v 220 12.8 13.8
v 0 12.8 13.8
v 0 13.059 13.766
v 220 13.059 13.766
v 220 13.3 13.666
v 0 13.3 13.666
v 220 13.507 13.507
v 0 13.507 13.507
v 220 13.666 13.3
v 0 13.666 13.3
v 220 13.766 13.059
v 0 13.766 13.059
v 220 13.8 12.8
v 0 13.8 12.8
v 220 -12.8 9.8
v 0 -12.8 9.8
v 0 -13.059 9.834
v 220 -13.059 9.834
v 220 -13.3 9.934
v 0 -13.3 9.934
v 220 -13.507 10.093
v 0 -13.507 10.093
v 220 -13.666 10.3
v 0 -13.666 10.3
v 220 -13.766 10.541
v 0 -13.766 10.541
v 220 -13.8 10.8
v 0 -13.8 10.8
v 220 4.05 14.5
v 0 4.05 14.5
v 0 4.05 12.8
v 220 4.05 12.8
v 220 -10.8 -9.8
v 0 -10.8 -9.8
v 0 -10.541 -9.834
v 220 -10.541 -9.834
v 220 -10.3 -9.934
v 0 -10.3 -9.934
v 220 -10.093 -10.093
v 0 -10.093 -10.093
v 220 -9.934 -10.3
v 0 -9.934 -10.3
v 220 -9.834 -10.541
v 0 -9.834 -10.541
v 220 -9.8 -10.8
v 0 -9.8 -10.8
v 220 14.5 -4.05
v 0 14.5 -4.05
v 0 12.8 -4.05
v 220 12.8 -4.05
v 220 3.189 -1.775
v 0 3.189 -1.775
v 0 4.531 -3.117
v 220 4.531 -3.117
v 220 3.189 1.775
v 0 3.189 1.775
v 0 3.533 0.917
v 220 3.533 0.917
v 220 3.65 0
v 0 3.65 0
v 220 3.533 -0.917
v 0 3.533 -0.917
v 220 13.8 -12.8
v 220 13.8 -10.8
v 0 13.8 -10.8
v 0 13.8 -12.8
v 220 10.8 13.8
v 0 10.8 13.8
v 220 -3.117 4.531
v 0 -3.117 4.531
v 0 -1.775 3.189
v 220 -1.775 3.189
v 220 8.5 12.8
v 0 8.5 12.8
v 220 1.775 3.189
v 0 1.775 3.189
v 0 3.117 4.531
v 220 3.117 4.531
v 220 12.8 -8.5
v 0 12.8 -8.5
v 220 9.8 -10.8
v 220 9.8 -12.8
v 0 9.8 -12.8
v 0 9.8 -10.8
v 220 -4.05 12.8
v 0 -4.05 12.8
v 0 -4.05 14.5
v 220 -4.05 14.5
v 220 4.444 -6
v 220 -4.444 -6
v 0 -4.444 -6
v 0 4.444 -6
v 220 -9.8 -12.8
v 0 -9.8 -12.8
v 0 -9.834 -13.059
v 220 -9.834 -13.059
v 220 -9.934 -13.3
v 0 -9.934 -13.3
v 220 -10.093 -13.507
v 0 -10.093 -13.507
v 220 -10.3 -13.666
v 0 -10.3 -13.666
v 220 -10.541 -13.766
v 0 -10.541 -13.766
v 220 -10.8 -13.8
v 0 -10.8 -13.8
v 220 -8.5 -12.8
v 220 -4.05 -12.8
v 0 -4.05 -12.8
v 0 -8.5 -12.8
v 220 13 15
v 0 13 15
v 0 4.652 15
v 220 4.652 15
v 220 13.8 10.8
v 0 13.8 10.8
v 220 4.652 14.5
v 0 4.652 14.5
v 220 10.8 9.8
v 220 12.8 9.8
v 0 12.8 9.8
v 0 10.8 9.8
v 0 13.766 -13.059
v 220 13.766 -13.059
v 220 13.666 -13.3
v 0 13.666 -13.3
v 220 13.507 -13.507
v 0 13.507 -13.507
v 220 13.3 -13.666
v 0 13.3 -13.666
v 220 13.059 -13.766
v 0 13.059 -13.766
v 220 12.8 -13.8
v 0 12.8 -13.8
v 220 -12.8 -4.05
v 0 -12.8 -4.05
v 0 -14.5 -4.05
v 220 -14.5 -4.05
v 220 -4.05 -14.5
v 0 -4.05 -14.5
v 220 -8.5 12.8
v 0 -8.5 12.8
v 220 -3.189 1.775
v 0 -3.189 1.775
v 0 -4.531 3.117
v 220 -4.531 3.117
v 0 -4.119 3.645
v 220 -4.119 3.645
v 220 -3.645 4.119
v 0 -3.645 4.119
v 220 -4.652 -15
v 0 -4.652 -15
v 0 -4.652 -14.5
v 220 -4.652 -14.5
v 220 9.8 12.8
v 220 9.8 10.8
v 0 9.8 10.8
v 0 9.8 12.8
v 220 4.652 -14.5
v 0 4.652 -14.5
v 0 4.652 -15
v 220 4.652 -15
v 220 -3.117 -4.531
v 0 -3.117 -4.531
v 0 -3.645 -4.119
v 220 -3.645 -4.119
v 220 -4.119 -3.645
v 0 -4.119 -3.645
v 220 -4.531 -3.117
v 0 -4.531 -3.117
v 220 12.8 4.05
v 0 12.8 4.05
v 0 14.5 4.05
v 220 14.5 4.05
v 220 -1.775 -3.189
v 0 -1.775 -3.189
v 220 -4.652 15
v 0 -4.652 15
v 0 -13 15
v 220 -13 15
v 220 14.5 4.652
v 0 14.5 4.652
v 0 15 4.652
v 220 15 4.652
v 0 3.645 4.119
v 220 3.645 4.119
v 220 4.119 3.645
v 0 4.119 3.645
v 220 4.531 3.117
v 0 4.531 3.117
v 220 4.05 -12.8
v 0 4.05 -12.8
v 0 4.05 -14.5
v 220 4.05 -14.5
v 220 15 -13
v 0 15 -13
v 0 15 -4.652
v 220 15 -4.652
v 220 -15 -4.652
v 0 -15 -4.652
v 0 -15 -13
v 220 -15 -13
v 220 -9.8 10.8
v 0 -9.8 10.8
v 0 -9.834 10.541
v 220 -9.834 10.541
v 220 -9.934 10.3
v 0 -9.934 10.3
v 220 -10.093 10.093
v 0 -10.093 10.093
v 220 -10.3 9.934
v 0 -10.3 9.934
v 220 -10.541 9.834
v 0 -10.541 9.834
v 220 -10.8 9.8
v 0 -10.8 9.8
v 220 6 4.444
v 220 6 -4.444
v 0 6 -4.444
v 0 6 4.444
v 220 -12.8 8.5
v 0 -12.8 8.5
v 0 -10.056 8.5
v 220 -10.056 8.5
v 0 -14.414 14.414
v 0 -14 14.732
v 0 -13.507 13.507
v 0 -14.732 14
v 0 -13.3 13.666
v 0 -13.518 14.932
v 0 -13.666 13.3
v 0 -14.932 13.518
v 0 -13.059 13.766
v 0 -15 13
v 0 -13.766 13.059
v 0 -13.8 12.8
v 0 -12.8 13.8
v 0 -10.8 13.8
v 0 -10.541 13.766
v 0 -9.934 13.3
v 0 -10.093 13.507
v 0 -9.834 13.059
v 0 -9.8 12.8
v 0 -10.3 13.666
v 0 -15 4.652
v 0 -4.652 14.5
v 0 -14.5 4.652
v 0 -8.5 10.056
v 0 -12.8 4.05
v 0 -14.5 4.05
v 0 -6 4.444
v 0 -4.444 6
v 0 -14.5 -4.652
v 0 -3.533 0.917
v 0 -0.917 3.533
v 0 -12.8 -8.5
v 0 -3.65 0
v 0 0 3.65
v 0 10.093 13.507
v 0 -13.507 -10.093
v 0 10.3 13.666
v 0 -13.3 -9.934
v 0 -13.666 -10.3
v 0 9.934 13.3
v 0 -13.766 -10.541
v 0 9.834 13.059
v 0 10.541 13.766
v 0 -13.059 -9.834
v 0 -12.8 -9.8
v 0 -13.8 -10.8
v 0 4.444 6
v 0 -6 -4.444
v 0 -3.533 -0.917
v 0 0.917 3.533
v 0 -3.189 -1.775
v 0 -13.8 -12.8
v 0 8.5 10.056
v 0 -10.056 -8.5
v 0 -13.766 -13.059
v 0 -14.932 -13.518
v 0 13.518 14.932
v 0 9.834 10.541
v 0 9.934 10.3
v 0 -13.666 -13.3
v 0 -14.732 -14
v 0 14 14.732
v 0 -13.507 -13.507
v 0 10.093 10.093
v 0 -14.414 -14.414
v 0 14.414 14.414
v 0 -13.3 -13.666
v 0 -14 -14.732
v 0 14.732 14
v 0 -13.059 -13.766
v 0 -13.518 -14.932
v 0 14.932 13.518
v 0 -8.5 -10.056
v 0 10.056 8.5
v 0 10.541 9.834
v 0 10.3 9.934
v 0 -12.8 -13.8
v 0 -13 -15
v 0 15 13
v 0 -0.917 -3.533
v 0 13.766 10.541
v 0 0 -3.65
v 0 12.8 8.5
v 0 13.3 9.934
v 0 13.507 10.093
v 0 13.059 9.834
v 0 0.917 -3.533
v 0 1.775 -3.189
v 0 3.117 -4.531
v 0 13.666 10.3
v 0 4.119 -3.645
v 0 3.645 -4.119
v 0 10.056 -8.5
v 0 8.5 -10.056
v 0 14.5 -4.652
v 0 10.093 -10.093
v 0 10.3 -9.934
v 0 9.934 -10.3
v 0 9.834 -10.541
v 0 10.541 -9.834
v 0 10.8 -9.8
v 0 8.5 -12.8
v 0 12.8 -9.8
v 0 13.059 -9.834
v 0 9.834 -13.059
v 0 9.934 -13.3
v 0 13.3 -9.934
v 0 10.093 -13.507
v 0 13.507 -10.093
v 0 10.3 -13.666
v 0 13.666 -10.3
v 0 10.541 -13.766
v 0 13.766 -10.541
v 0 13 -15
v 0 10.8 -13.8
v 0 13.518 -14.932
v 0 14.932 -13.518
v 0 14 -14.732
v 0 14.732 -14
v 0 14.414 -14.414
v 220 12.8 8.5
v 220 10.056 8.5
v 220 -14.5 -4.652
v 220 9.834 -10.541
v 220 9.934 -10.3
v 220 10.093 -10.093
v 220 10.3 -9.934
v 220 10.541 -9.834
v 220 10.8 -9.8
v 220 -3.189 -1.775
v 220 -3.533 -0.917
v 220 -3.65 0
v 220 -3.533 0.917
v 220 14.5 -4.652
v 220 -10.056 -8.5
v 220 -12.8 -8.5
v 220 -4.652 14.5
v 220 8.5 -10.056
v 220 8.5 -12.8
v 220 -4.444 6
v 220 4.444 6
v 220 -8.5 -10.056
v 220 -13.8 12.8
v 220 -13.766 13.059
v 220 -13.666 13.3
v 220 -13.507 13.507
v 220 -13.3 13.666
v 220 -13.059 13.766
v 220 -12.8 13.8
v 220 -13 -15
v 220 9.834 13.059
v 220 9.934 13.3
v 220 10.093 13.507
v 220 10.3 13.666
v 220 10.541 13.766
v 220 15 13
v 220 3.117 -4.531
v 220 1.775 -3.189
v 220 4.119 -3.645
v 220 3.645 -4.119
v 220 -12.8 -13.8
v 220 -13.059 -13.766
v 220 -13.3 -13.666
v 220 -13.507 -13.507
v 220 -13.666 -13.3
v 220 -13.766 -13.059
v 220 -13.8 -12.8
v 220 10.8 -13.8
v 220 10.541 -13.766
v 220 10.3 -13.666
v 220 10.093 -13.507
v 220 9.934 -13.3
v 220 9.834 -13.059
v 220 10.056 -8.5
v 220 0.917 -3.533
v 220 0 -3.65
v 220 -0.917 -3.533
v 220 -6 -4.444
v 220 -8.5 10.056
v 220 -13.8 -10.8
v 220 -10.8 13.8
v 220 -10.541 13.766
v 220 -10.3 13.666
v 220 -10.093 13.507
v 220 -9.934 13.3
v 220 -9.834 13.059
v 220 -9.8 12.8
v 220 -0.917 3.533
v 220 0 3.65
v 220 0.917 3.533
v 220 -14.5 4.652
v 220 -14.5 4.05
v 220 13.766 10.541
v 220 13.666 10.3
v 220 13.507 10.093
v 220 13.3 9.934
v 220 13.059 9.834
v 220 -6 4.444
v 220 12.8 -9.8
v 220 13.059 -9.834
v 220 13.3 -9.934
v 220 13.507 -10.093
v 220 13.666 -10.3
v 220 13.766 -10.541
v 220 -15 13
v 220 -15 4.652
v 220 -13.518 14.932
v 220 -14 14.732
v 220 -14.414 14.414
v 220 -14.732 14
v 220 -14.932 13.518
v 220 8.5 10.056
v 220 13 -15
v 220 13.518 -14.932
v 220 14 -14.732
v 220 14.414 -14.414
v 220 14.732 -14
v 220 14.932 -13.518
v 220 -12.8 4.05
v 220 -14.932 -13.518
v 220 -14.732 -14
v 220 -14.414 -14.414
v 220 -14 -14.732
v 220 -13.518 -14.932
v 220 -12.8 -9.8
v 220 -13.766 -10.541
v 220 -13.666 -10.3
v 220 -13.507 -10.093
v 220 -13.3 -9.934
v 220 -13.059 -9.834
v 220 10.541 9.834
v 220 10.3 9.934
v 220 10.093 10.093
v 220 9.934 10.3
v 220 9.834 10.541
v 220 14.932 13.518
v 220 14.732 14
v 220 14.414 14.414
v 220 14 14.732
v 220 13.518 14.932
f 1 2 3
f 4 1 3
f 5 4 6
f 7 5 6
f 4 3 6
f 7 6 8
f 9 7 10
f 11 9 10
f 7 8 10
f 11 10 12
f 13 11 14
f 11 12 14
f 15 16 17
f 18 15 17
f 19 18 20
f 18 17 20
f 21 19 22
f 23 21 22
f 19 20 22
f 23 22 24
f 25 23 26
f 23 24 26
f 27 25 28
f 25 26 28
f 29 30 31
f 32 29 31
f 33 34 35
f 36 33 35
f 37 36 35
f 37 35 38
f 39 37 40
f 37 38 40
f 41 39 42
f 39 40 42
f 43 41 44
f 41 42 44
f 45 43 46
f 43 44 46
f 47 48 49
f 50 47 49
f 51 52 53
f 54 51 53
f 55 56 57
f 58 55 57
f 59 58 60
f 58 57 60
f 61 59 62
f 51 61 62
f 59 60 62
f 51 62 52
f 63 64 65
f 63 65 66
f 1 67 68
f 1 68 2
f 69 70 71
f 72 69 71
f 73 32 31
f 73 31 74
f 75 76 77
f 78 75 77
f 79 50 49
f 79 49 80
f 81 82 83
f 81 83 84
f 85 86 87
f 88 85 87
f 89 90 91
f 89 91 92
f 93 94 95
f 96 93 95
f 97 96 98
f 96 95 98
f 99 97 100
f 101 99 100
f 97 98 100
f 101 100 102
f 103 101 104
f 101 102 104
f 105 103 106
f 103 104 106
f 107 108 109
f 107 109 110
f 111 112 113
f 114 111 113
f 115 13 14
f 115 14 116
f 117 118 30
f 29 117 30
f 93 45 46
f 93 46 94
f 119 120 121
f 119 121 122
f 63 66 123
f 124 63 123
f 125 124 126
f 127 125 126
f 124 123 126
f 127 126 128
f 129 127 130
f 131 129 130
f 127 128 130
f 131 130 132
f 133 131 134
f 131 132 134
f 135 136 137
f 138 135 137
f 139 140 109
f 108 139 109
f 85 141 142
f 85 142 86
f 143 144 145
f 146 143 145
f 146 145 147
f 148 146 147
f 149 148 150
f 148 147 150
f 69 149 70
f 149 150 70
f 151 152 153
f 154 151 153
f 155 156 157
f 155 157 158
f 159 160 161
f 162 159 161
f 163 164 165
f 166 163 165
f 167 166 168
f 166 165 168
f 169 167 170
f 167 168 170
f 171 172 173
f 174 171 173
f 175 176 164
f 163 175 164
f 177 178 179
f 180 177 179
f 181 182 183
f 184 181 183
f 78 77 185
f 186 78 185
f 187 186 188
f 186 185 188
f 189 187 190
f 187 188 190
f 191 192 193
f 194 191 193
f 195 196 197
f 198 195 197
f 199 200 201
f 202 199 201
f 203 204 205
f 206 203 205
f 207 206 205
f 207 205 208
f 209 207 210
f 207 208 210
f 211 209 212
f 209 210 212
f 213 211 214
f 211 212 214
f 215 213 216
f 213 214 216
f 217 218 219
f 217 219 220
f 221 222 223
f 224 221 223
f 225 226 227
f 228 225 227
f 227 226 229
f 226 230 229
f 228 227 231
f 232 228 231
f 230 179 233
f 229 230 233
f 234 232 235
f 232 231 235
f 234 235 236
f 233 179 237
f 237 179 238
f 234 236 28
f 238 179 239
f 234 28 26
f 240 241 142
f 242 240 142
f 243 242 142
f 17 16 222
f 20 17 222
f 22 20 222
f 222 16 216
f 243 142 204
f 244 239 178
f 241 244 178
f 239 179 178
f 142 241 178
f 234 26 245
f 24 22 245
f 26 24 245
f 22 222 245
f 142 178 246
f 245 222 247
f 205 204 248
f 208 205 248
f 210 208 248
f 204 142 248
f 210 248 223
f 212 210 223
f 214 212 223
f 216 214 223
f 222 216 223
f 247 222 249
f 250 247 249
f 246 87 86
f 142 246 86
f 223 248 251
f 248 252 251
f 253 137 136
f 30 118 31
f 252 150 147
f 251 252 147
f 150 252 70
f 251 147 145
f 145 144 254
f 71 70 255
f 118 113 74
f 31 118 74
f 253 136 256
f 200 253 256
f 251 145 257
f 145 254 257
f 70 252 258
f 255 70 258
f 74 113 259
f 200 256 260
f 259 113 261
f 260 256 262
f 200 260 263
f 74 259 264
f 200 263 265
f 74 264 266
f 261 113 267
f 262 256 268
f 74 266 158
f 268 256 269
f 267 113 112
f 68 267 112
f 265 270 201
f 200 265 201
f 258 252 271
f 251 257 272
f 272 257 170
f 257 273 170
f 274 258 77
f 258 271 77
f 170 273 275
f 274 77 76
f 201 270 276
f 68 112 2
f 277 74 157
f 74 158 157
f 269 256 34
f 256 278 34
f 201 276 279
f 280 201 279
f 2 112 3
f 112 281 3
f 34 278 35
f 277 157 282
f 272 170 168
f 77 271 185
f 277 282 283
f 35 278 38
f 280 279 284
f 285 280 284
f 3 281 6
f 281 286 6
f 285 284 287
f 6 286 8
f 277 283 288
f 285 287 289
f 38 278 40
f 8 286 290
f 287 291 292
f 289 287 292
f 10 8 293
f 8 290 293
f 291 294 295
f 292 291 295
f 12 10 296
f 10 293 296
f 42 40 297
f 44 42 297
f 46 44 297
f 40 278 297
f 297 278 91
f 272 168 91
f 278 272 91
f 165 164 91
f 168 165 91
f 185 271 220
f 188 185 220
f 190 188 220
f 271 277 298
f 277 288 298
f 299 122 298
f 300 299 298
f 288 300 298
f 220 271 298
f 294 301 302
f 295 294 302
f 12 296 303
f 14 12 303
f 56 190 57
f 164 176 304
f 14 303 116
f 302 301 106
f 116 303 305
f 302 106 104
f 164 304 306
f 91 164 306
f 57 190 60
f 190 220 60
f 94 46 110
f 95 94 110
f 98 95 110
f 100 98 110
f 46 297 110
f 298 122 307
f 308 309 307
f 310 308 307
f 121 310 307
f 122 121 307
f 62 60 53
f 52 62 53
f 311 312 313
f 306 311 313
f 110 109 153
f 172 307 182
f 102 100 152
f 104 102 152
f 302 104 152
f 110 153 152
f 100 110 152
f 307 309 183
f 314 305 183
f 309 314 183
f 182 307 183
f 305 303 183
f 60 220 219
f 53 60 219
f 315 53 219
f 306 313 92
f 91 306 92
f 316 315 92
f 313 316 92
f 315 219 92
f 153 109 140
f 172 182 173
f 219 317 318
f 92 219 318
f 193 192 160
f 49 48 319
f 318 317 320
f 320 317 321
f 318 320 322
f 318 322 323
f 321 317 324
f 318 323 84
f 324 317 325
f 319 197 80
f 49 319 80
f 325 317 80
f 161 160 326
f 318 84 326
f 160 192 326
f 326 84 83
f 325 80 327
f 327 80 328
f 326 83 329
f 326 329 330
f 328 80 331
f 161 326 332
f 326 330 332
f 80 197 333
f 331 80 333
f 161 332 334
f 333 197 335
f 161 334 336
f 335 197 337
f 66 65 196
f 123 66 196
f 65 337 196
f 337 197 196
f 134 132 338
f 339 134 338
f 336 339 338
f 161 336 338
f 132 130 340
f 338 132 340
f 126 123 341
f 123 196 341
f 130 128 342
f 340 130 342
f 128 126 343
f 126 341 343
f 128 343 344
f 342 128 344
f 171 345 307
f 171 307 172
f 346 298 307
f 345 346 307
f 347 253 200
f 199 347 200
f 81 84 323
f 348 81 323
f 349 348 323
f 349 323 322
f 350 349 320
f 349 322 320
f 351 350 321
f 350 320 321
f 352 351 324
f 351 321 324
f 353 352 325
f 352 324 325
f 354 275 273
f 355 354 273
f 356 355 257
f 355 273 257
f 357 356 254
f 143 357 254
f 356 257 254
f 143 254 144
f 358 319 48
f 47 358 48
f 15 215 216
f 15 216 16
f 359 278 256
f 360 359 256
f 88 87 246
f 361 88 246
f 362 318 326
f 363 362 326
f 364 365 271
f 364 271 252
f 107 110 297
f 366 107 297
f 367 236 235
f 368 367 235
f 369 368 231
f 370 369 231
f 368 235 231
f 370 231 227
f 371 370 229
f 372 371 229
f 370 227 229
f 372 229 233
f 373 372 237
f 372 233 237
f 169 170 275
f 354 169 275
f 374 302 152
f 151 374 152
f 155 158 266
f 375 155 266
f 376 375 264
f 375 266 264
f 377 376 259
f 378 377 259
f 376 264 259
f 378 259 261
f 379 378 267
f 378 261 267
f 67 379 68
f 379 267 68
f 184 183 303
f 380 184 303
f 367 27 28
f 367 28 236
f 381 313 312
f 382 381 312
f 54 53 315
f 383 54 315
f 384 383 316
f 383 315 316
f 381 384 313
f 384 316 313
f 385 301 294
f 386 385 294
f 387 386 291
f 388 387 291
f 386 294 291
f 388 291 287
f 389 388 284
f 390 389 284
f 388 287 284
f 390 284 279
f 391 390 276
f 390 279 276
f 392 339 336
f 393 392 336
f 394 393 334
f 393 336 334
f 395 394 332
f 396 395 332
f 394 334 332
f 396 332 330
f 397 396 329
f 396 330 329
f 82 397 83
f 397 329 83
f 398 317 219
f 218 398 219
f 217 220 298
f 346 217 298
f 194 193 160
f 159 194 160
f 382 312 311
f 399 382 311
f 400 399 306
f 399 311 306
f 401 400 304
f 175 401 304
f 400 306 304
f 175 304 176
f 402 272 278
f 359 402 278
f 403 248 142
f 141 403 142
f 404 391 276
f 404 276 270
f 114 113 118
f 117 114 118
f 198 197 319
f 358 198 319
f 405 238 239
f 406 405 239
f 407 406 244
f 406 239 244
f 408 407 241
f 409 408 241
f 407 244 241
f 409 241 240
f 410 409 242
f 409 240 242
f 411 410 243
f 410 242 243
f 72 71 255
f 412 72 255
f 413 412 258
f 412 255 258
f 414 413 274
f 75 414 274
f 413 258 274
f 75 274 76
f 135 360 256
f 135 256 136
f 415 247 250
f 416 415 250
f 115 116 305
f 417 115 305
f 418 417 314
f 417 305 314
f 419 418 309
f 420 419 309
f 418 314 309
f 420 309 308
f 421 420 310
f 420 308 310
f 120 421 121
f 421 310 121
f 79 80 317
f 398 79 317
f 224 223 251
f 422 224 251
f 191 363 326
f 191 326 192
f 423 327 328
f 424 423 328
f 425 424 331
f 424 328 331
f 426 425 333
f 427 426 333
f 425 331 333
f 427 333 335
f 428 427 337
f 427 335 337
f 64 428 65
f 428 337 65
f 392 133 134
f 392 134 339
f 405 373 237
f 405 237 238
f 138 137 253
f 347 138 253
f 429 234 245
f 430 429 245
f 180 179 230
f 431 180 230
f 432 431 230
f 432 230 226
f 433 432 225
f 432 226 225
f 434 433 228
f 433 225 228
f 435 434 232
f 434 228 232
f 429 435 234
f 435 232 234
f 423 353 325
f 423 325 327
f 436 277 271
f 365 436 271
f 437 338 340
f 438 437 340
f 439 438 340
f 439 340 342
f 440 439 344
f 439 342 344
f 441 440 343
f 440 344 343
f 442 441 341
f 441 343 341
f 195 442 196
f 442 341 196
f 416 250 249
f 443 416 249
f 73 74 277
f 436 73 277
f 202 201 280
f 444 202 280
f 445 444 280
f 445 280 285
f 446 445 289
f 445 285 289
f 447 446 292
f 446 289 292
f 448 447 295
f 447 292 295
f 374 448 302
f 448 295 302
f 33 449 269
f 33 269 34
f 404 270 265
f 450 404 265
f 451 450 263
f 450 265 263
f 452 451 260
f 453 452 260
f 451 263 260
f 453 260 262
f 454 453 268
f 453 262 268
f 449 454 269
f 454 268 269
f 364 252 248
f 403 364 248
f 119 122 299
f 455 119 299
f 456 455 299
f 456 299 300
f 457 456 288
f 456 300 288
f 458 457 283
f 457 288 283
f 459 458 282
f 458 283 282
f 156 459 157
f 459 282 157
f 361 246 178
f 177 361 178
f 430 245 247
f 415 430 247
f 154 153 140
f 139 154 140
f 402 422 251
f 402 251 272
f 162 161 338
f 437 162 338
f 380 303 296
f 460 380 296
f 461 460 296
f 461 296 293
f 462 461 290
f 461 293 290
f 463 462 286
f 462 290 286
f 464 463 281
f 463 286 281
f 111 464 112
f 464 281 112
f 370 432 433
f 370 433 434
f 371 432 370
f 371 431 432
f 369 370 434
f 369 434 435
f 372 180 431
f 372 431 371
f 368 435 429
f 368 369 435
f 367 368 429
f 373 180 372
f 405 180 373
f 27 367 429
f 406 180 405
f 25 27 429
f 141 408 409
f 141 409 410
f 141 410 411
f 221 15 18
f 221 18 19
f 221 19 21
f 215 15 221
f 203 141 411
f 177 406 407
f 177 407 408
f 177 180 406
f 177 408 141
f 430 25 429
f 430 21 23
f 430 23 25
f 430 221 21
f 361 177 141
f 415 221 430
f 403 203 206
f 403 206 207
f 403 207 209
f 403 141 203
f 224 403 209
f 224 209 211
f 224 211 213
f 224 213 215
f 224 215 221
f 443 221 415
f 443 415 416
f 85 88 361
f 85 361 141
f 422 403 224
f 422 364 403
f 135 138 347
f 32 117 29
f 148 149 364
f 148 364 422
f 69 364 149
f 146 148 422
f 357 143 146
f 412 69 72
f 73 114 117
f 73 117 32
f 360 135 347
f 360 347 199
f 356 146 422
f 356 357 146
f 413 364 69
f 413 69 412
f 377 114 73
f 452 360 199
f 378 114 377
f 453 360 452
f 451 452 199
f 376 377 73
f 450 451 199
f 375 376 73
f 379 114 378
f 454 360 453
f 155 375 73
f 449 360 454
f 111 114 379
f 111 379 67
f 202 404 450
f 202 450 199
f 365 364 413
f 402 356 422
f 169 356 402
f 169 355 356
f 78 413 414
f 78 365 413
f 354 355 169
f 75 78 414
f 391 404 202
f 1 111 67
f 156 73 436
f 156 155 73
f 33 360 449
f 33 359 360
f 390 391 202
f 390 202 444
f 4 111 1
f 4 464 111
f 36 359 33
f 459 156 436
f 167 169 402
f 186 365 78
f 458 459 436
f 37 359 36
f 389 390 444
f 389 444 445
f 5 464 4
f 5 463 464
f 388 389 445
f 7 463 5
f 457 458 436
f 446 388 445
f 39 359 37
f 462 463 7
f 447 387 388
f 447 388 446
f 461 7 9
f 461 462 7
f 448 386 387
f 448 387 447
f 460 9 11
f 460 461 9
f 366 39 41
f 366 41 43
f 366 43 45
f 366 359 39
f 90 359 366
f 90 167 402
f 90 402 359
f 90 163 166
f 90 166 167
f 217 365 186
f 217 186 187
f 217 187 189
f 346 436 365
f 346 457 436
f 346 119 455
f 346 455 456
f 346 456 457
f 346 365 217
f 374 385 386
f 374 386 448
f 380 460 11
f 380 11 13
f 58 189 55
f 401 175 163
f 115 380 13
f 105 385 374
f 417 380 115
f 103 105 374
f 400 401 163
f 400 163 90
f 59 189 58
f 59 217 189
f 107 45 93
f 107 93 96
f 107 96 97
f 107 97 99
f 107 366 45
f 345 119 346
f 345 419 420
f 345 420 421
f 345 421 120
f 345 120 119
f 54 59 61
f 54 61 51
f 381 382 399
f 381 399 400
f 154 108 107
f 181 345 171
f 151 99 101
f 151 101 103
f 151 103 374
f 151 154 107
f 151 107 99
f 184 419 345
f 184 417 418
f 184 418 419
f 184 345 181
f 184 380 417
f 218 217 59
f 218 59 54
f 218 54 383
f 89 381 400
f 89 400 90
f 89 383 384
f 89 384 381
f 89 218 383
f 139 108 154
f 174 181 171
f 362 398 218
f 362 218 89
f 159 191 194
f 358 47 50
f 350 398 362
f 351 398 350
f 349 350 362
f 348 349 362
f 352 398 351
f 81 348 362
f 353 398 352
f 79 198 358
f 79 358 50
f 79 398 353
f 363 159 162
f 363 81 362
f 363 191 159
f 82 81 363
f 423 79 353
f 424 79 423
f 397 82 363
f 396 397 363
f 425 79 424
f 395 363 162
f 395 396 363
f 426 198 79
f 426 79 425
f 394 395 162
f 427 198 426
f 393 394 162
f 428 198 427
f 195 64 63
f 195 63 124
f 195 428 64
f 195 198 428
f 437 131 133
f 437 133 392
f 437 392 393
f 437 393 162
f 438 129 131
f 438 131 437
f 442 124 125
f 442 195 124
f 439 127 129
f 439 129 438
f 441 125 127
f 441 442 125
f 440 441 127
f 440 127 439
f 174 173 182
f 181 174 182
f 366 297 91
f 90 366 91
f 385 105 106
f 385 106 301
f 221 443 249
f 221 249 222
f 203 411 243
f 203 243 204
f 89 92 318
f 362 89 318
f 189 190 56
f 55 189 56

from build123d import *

# Parameters (mm, degrees)
AUFSATZ_LINEAR_AUSTRAGEN1_DEPTH = 220


with BuildPart() as part:
    # Skizze1 → Aufsatz-Linear austragen1 (new body)
    with BuildSketch(Plane(origin=(0, 0, 0), x_dir=(0, 0, -1), z_dir=(1, 0, 0))):
        with BuildLine():
            Line((10.055634919, 8.5), (12.8, 8.5))
            Line((12.8, 8.5), (12.8, 4.05))
            Line((12.8, 4.05), (14.5, 4.05))
            Line((14.5, 4.05), (14.5, 4.651637069))
            Line((14.5, 4.651637069), (15, 4.651637069))
            Line((15, 4.651637069), (15, 13))
            ThreePointArc((15, 13), (14.414213562, 14.414213562), (13, 15))
            Line((13, 15), (4.651637069, 15))
            Line((4.651637069, 15), (4.651637069, 14.5))
            Line((4.651637069, 14.5), (4.05, 14.5))
            Line((4.05, 14.5), (4.05, 12.8))
            Line((4.05, 12.8), (8.5, 12.8))
            Line((8.5, 12.8), (8.5, 10.055634919))
            Line((8.5, 10.055634919), (4.444365081, 6))
            Line((4.444365081, 6), (-4.444365081, 6))
            Line((-4.444365081, 6), (-8.5, 10.055634919))
            Line((-8.5, 10.055634919), (-8.5, 12.8))
            Line((-8.5, 12.8), (-4.05, 12.8))
            Line((-4.05, 12.8), (-4.05, 14.5))
            Line((-4.05, 14.5), (-4.651637069, 14.5))
            Line((-4.651637069, 14.5), (-4.651637069, 15))
            Line((-4.651637069, 15), (-13, 15))
            ThreePointArc((-13, 15), (-14.414213562, 14.414213562), (-15, 13))
            Line((-15, 13), (-15, 4.651637069))
            Line((-15, 4.651637069), (-14.5, 4.651637069))
            Line((-14.5, 4.651637069), (-14.5, 4.05))
            Line((-14.5, 4.05), (-12.8, 4.05))
            Line((-12.8, 4.05), (-12.8, 8.5))
            Line((-12.8, 8.5), (-10.055634919, 8.5))
            Line((-10.055634919, 8.5), (-6, 4.444365081))
            Line((-6, 4.444365081), (-6, -4.444365081))
            Line((-6, -4.444365081), (-10.055634919, -8.5))
            Line((-10.055634919, -8.5), (-12.8, -8.5))
            Line((-12.8, -8.5), (-12.8, -4.05))
            Line((-12.8, -4.05), (-14.5, -4.05))
            Line((-14.5, -4.05), (-14.5, -4.651637069))
            Line((-14.5, -4.651637069), (-15, -4.651637069))
            Line((-15, -4.651637069), (-15, -13))
            ThreePointArc((-15, -13), (-14.414213562, -14.414213562), (-13, -15))
            Line((-13, -15), (-4.651637069, -15))
            Line((-4.651637069, -15), (-4.651637069, -14.5))
            Line((-4.651637069, -14.5), (-4.05, -14.5))
            Line((-4.05, -14.5), (-4.05, -12.8))
            Line((-4.05, -12.8), (-8.5, -12.8))
            Line((-8.5, -12.8), (-8.5, -10.055634919))
            Line((-8.5, -10.055634919), (-4.444365081, -6))
            Line((-4.444365081, -6), (4.444365081, -6))
            Line((4.444365081, -6), (8.5, -10.055634919))
            Line((8.5, -10.055634919), (8.5, -12.8))
            Line((8.5, -12.8), (4.05, -12.8))
            Line((4.05, -12.8), (4.05, -14.5))
            Line((4.05, -14.5), (4.651637069, -14.5))
            Line((4.651637069, -14.5), (4.651637069, -15))
            Line((4.651637069, -15), (13, -15))
            ThreePointArc((13, -15), (14.414213562, -14.414213562), (15, -13))
            Line((15, -13), (15, -4.651637069))
            Line((15, -4.651637069), (14.5, -4.651637069))
            Line((14.5, -4.651637069), (14.5, -4.05))
            Line((14.5, -4.05), (12.8, -4.05))
            Line((12.8, -4.05), (12.8, -8.5))
            Line((12.8, -8.5), (10.055634919, -8.5))
            Line((10.055634919, -8.5), (6, -4.444365081))
            Line((6, -4.444365081), (6, 4.444365081))
            Line((6, 4.444365081), (10.055634919, 8.5))
        make_face()
        with BuildLine():
            ThreePointArc((12.8, 13.8), (13.507106781, 13.507106781), (13.8, 12.8))
            Line((13.8, 12.8), (13.8, 10.8))
            ThreePointArc((13.8, 10.8), (13.507106781, 10.092893219), (12.8, 9.8))
            Line((12.8, 9.8), (10.8, 9.8))
            ThreePointArc((10.8, 9.8), (10.092893219, 10.092893219), (9.8, 10.8))
            Line((9.8, 10.8), (9.8, 12.8))
            ThreePointArc((9.8, 12.8), (10.092893219, 13.507106781), (10.8, 13.8))
            Line((10.8, 13.8), (12.8, 13.8))
        make_face(mode=Mode.SUBTRACT)
        with BuildLine():
            Line((-3.117157854, 4.531371416), (-1.775079755, 3.189293317))
            ThreePointArc((-1.775079755, 3.189293317), (0, 3.65), (1.775079755, 3.189293317))
            Line((1.775079755, 3.189293317), (3.117157854, 4.531371416))
            ThreePointArc((3.117157854, 4.531371416), (3.889087297, 3.889087297), (4.531371416, 3.117157854))
            Line((4.531371416, 3.117157854), (3.189293317, 1.775079755))
            ThreePointArc((3.189293317, 1.775079755), (3.65, 0), (3.189293317, -1.775079755))
            Line((3.189293317, -1.775079755), (4.531371416, -3.117157854))
            ThreePointArc((4.531371416, -3.117157854), (3.889087297, -3.889087297), (3.117157854, -4.531371416))
            Line((3.117157854, -4.531371416), (1.775079755, -3.189293317))
            ThreePointArc((1.775079755, -3.189293317), (0, -3.65), (-1.775079755, -3.189293317))
            Line((-1.775079755, -3.189293317), (-3.117157854, -4.531371416))
            ThreePointArc((-3.117157854, -4.531371416), (-3.889087297, -3.889087297), (-4.531371416, -3.117157854))
            Line((-4.531371416, -3.117157854), (-3.189293317, -1.775079755))
            ThreePointArc((-3.189293317, -1.775079755), (-3.65, 0), (-3.189293317, 1.775079755))
            Line((-3.189293317, 1.775079755), (-4.531371416, 3.117157854))
            ThreePointArc((-4.531371416, 3.117157854), (-3.889087297, 3.889087297), (-3.117157854, 4.531371416))
        make_face(mode=Mode.SUBTRACT)
        with BuildLine():
            ThreePointArc((-13.8, 12.8), (-13.507106781, 13.507106781), (-12.8, 13.8))
            Line((-12.8, 13.8), (-10.8, 13.8))
            ThreePointArc((-10.8, 13.8), (-10.092893219, 13.507106781), (-9.8, 12.8))
            Line((-9.8, 12.8), (-9.8, 10.8))
            ThreePointArc((-9.8, 10.8), (-10.092893219, 10.092893219), (-10.8, 9.8))
            Line((-10.8, 9.8), (-12.8, 9.8))
            ThreePointArc((-12.8, 9.8), (-13.507106781, 10.092893219), (-13.8, 10.8))
            Line((-13.8, 10.8), (-13.8, 12.8))
        make_face(mode=Mode.SUBTRACT)
        with BuildLine():
            ThreePointArc((9.8, -10.8), (10.092893219, -10.092893219), (10.8, -9.8))
            Line((10.8, -9.8), (12.8, -9.8))
            ThreePointArc((12.8, -9.8), (13.507106781, -10.092893219), (13.8, -10.8))
            Line((13.8, -10.8), (13.8, -12.8))
            ThreePointArc((13.8, -12.8), (13.507106781, -13.507106781), (12.8, -13.8))
            Line((12.8, -13.8), (10.8, -13.8))
            ThreePointArc((10.8, -13.8), (10.092893219, -13.507106781), (9.8, -12.8))
            Line((9.8, -12.8), (9.8, -10.8))
        make_face(mode=Mode.SUBTRACT)
        with BuildLine():
            Line((-9.8, -10.8), (-9.8, -12.8))
            ThreePointArc((-9.8, -12.8), (-10.092893219, -13.507106781), (-10.8, -13.8))
            Line((-10.8, -13.8), (-12.8, -13.8))
            ThreePointArc((-12.8, -13.8), (-13.507106781, -13.507106781), (-13.8, -12.8))
            Line((-13.8, -12.8), (-13.8, -10.8))
            ThreePointArc((-13.8, -10.8), (-13.507106781, -10.092893219), (-12.8, -9.8))
            Line((-12.8, -9.8), (-10.8, -9.8))
            ThreePointArc((-10.8, -9.8), (-10.092893219, -10.092893219), (-9.8, -10.8))
        make_face(mode=Mode.SUBTRACT)
    extrude(amount=AUFSATZ_LINEAR_AUSTRAGEN1_DEPTH)


solid = part.part
